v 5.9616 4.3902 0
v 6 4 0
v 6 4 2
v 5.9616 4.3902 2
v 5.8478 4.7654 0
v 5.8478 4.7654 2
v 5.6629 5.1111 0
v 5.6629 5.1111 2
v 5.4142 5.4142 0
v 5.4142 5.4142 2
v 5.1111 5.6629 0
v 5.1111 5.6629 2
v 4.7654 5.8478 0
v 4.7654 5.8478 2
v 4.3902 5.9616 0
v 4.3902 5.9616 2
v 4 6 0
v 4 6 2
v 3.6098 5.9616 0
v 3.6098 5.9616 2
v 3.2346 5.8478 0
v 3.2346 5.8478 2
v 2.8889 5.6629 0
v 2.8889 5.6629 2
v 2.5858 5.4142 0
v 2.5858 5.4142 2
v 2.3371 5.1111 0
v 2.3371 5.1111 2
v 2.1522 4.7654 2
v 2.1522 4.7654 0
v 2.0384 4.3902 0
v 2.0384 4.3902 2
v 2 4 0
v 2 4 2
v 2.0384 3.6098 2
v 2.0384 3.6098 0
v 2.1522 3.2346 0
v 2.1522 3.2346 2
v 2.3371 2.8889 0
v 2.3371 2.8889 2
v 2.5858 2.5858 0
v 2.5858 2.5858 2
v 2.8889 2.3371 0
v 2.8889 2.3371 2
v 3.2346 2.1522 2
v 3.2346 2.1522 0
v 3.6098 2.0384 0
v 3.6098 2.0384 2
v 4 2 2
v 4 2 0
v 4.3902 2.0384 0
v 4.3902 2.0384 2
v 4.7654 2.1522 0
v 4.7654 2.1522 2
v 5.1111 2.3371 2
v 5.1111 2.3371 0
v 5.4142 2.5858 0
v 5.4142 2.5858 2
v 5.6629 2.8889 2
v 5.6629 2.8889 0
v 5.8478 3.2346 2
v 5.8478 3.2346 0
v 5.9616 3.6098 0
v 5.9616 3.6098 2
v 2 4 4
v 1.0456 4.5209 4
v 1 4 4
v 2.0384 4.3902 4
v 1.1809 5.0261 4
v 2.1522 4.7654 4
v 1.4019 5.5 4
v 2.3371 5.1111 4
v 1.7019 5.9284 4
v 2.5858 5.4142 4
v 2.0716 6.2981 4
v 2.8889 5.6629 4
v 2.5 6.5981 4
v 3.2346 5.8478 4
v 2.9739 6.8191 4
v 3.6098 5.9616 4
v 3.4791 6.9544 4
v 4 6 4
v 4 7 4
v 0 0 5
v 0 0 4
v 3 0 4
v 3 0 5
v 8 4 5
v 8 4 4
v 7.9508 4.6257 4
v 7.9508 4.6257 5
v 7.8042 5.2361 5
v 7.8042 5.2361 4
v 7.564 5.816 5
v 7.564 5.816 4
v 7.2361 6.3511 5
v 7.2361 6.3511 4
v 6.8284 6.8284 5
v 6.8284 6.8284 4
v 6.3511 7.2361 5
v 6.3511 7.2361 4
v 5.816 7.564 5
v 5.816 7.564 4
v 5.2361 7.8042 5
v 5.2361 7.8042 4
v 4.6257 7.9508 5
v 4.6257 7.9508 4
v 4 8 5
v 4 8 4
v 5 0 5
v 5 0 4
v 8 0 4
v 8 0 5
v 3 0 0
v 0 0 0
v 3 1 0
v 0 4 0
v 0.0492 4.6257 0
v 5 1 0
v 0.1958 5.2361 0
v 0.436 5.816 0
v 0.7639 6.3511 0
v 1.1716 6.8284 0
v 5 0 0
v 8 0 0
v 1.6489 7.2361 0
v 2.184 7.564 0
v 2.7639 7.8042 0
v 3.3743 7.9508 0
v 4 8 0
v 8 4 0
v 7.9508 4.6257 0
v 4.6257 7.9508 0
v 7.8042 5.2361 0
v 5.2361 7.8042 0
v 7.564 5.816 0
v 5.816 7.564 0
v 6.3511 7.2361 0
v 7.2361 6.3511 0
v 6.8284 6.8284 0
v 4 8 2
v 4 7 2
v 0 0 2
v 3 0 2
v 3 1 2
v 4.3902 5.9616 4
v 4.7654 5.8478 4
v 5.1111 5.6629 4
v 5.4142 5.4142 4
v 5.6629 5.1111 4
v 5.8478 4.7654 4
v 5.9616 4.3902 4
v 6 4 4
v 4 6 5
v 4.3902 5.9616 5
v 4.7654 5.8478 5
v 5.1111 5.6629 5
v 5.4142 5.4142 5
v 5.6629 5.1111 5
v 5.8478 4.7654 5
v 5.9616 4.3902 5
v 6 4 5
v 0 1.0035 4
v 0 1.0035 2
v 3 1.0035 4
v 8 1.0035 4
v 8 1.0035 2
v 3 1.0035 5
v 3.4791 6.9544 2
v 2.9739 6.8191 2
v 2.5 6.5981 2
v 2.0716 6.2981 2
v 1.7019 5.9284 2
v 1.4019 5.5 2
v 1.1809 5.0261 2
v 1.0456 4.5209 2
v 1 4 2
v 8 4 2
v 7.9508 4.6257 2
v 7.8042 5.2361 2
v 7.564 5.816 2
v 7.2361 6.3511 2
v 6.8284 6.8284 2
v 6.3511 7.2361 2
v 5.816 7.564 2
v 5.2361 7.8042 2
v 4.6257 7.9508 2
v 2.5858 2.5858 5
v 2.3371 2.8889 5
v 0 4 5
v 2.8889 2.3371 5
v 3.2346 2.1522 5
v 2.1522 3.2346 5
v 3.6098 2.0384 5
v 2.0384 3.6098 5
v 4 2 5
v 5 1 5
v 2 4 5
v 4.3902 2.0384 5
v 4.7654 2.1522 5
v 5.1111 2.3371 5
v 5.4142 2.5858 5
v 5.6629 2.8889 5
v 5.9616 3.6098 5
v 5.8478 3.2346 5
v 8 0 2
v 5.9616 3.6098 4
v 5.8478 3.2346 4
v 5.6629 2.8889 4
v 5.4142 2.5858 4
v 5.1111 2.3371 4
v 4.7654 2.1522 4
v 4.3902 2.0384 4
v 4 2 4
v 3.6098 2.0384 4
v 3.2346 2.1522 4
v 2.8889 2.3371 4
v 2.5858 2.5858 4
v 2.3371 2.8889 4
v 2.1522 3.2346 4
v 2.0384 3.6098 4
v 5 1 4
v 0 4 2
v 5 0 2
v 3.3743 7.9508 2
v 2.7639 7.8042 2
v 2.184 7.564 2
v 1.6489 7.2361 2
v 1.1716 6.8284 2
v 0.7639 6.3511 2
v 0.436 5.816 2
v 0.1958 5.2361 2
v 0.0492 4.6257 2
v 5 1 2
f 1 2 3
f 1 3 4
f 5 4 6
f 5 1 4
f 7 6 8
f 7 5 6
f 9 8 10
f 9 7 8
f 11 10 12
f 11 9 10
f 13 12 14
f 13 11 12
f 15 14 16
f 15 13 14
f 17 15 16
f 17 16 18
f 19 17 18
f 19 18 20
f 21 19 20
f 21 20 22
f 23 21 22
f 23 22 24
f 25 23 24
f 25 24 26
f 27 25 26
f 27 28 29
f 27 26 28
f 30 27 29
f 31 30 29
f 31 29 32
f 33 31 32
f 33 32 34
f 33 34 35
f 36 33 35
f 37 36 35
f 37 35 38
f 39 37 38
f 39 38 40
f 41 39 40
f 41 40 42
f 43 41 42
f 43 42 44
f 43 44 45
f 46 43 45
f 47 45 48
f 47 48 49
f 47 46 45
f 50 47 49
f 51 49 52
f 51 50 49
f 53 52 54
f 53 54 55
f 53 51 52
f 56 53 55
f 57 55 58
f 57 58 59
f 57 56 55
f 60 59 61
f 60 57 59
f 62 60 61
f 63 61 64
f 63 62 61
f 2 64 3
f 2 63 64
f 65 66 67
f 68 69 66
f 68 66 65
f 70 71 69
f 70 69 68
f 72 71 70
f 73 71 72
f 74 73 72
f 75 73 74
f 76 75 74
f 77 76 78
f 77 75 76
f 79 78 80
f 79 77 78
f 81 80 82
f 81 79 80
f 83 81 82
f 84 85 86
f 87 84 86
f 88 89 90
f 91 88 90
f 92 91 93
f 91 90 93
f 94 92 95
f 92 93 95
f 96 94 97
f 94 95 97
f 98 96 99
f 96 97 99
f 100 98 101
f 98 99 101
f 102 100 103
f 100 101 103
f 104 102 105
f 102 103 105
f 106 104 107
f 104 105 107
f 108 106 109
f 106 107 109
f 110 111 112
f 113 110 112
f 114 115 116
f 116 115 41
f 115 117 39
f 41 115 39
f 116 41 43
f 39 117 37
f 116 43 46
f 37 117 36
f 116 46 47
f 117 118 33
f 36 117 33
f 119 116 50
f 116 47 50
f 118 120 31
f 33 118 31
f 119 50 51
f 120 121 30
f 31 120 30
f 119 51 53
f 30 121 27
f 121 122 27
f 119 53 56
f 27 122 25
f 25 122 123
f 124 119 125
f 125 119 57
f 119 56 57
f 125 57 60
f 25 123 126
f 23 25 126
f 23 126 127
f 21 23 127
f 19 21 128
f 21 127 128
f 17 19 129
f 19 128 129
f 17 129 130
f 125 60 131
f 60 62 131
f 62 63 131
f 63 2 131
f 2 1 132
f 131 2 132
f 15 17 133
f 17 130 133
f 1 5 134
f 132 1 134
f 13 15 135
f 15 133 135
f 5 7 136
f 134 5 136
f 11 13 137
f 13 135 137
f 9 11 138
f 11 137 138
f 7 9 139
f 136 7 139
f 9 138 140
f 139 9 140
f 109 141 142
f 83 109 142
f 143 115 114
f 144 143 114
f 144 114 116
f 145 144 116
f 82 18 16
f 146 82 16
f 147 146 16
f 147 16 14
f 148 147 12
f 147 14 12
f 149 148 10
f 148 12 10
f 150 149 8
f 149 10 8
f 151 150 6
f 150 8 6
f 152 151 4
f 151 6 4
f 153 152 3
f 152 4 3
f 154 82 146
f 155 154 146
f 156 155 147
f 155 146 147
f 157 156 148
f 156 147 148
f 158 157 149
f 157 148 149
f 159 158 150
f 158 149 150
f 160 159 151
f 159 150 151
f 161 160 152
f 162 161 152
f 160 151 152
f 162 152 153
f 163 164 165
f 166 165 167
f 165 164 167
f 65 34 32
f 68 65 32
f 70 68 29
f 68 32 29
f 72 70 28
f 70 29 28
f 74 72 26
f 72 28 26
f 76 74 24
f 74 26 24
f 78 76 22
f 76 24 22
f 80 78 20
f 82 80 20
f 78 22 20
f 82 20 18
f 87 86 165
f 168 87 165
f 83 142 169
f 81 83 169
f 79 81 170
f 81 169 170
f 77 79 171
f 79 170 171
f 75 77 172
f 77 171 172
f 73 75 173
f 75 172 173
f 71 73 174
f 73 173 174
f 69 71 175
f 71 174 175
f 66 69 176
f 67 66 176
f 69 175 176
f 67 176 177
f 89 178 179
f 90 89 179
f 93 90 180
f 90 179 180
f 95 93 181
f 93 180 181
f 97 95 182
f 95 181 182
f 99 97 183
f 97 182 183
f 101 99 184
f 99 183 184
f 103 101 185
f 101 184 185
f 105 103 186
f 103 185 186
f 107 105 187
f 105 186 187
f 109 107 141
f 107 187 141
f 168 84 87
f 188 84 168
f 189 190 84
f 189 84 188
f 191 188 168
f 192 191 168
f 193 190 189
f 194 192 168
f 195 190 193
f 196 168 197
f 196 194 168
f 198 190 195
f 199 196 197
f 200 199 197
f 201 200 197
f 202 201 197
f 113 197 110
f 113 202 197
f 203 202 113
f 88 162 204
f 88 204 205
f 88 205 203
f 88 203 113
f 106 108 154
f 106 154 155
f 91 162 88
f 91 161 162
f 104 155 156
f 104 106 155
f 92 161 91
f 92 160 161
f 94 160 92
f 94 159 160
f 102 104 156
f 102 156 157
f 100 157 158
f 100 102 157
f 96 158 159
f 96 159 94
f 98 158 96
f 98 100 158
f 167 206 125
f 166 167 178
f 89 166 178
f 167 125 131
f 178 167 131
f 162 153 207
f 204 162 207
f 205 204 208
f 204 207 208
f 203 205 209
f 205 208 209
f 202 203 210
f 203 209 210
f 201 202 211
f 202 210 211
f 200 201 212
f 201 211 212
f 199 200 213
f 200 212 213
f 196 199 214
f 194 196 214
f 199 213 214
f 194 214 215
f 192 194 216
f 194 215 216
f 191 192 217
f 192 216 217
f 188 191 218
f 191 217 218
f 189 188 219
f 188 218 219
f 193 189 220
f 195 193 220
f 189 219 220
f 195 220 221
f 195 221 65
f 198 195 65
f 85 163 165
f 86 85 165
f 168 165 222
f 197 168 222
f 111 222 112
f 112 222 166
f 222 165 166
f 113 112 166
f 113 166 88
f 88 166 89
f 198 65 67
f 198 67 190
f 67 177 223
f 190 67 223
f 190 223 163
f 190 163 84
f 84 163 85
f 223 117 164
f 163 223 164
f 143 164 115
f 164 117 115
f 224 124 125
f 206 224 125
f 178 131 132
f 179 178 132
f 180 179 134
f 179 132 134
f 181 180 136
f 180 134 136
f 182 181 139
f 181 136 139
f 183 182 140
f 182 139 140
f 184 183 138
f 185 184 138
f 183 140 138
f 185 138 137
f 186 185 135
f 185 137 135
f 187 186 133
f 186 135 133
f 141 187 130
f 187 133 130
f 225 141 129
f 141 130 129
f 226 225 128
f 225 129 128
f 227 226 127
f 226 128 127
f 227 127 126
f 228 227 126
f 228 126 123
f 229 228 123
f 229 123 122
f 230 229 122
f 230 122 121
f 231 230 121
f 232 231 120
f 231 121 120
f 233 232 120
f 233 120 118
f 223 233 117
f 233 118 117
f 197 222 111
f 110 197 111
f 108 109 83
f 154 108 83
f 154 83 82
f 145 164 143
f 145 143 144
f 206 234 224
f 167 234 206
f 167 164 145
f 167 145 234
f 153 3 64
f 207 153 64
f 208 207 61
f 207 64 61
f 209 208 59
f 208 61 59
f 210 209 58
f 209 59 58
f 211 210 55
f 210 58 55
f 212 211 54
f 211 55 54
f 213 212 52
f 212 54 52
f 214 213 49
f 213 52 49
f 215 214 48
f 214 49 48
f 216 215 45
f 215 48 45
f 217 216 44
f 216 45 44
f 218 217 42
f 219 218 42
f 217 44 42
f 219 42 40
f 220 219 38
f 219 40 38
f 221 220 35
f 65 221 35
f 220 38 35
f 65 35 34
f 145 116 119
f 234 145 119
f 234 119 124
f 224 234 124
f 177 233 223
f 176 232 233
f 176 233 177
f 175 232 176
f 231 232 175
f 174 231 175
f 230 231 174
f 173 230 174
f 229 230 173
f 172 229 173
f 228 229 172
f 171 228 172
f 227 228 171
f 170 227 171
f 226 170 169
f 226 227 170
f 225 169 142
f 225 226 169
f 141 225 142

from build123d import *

# Parameters (mm, degrees)
SKETCH2_R           = 2
BOSS_EXTRUDE1_DEPTH = 2
BOSS_EXTRUDE2_DEPTH = 2
SKETCH4_W           = 3
SKETCH4_H           = 1.003544002
BOSS_EXTRUDE3_DEPTH = 1


with BuildPart() as part:
    # Sketch2 → Boss-Extrude1 (new body)
    with BuildSketch(Plane.XY):
        with BuildLine():
            Line((0, 0), (3, 0))
            Line((3, 0), (3, 1))
            Line((3, 1), (5, 1))
            Line((5, 1), (5, 0))
            Line((5, 0), (8, 0))
            Line((8, 0), (8, 4))
            ThreePointArc((8, 4), (4, 8), (0, 4))
            Line((0, 4), (0, 0))
        make_face()
        with Locations((4, 4)):
            Circle(SKETCH2_R, mode=Mode.SUBTRACT)
    extrude(amount=BOSS_EXTRUDE1_DEPTH)

    # Sketch3 → Boss-Extrude2 (add)
    with BuildSketch(Plane.XY.offset(2)):
        with BuildLine():
            Line((4, 8), (4, 7))
            ThreePointArc((4, 7), (1.878679656, 6.121320344), (1, 4))
            Line((1, 4), (0, 4))
            Line((0, 4), (0, 1.003544002))
            Line((0, 1.003544002), (8, 1.003544002))
            Line((8, 1.003544002), (8, 4))
            ThreePointArc((8, 4), (6.828427125, 6.828427125), (4, 8))
        make_face()
        with BuildLine():
            ThreePointArc((6, 4), (4, 2), (2, 4))
            ThreePointArc((2, 4), (2.585786438, 5.414213562), (4, 6))
            ThreePointArc((4, 6), (5.414213562, 5.414213562), (6, 4))
        make_face(mode=Mode.SUBTRACT)
    extrude(amount=BOSS_EXTRUDE2_DEPTH)

    # Sketch4 → Boss-Extrude3 (add)
    with BuildSketch(Plane.XY.offset(4)):
        with BuildLine():
            Line((1, 4), (0, 4))
            Line((0, 4), (0, 1.003544002))
            Line((0, 1.003544002), (3, 1.003544002))
            Line((3, 1.003544002), (8, 1.003544002))
            Line((8, 1.003544002), (8, 4))
            ThreePointArc((8, 4), (6.828427125, 6.828427125), (4, 8))
            Line((4, 8), (4, 7))
            Line((4, 7), (4, 6))
            ThreePointArc((4, 6), (5.414213562, 5.414213562), (6, 4))
            ThreePointArc((6, 4), (4, 2), (2, 4))
            Line((2, 4), (1, 4))
        make_face()
        with Locations((1.5, 0.501772001)):
            Rectangle(SKETCH4_W, SKETCH4_H)
        Polygon((8, 1.003544002), (3, 1.003544002), (5, 1), (5, 0), (8, 0), align=None)
    extrude(amount=BOSS_EXTRUDE3_DEPTH)


solid = part.part
